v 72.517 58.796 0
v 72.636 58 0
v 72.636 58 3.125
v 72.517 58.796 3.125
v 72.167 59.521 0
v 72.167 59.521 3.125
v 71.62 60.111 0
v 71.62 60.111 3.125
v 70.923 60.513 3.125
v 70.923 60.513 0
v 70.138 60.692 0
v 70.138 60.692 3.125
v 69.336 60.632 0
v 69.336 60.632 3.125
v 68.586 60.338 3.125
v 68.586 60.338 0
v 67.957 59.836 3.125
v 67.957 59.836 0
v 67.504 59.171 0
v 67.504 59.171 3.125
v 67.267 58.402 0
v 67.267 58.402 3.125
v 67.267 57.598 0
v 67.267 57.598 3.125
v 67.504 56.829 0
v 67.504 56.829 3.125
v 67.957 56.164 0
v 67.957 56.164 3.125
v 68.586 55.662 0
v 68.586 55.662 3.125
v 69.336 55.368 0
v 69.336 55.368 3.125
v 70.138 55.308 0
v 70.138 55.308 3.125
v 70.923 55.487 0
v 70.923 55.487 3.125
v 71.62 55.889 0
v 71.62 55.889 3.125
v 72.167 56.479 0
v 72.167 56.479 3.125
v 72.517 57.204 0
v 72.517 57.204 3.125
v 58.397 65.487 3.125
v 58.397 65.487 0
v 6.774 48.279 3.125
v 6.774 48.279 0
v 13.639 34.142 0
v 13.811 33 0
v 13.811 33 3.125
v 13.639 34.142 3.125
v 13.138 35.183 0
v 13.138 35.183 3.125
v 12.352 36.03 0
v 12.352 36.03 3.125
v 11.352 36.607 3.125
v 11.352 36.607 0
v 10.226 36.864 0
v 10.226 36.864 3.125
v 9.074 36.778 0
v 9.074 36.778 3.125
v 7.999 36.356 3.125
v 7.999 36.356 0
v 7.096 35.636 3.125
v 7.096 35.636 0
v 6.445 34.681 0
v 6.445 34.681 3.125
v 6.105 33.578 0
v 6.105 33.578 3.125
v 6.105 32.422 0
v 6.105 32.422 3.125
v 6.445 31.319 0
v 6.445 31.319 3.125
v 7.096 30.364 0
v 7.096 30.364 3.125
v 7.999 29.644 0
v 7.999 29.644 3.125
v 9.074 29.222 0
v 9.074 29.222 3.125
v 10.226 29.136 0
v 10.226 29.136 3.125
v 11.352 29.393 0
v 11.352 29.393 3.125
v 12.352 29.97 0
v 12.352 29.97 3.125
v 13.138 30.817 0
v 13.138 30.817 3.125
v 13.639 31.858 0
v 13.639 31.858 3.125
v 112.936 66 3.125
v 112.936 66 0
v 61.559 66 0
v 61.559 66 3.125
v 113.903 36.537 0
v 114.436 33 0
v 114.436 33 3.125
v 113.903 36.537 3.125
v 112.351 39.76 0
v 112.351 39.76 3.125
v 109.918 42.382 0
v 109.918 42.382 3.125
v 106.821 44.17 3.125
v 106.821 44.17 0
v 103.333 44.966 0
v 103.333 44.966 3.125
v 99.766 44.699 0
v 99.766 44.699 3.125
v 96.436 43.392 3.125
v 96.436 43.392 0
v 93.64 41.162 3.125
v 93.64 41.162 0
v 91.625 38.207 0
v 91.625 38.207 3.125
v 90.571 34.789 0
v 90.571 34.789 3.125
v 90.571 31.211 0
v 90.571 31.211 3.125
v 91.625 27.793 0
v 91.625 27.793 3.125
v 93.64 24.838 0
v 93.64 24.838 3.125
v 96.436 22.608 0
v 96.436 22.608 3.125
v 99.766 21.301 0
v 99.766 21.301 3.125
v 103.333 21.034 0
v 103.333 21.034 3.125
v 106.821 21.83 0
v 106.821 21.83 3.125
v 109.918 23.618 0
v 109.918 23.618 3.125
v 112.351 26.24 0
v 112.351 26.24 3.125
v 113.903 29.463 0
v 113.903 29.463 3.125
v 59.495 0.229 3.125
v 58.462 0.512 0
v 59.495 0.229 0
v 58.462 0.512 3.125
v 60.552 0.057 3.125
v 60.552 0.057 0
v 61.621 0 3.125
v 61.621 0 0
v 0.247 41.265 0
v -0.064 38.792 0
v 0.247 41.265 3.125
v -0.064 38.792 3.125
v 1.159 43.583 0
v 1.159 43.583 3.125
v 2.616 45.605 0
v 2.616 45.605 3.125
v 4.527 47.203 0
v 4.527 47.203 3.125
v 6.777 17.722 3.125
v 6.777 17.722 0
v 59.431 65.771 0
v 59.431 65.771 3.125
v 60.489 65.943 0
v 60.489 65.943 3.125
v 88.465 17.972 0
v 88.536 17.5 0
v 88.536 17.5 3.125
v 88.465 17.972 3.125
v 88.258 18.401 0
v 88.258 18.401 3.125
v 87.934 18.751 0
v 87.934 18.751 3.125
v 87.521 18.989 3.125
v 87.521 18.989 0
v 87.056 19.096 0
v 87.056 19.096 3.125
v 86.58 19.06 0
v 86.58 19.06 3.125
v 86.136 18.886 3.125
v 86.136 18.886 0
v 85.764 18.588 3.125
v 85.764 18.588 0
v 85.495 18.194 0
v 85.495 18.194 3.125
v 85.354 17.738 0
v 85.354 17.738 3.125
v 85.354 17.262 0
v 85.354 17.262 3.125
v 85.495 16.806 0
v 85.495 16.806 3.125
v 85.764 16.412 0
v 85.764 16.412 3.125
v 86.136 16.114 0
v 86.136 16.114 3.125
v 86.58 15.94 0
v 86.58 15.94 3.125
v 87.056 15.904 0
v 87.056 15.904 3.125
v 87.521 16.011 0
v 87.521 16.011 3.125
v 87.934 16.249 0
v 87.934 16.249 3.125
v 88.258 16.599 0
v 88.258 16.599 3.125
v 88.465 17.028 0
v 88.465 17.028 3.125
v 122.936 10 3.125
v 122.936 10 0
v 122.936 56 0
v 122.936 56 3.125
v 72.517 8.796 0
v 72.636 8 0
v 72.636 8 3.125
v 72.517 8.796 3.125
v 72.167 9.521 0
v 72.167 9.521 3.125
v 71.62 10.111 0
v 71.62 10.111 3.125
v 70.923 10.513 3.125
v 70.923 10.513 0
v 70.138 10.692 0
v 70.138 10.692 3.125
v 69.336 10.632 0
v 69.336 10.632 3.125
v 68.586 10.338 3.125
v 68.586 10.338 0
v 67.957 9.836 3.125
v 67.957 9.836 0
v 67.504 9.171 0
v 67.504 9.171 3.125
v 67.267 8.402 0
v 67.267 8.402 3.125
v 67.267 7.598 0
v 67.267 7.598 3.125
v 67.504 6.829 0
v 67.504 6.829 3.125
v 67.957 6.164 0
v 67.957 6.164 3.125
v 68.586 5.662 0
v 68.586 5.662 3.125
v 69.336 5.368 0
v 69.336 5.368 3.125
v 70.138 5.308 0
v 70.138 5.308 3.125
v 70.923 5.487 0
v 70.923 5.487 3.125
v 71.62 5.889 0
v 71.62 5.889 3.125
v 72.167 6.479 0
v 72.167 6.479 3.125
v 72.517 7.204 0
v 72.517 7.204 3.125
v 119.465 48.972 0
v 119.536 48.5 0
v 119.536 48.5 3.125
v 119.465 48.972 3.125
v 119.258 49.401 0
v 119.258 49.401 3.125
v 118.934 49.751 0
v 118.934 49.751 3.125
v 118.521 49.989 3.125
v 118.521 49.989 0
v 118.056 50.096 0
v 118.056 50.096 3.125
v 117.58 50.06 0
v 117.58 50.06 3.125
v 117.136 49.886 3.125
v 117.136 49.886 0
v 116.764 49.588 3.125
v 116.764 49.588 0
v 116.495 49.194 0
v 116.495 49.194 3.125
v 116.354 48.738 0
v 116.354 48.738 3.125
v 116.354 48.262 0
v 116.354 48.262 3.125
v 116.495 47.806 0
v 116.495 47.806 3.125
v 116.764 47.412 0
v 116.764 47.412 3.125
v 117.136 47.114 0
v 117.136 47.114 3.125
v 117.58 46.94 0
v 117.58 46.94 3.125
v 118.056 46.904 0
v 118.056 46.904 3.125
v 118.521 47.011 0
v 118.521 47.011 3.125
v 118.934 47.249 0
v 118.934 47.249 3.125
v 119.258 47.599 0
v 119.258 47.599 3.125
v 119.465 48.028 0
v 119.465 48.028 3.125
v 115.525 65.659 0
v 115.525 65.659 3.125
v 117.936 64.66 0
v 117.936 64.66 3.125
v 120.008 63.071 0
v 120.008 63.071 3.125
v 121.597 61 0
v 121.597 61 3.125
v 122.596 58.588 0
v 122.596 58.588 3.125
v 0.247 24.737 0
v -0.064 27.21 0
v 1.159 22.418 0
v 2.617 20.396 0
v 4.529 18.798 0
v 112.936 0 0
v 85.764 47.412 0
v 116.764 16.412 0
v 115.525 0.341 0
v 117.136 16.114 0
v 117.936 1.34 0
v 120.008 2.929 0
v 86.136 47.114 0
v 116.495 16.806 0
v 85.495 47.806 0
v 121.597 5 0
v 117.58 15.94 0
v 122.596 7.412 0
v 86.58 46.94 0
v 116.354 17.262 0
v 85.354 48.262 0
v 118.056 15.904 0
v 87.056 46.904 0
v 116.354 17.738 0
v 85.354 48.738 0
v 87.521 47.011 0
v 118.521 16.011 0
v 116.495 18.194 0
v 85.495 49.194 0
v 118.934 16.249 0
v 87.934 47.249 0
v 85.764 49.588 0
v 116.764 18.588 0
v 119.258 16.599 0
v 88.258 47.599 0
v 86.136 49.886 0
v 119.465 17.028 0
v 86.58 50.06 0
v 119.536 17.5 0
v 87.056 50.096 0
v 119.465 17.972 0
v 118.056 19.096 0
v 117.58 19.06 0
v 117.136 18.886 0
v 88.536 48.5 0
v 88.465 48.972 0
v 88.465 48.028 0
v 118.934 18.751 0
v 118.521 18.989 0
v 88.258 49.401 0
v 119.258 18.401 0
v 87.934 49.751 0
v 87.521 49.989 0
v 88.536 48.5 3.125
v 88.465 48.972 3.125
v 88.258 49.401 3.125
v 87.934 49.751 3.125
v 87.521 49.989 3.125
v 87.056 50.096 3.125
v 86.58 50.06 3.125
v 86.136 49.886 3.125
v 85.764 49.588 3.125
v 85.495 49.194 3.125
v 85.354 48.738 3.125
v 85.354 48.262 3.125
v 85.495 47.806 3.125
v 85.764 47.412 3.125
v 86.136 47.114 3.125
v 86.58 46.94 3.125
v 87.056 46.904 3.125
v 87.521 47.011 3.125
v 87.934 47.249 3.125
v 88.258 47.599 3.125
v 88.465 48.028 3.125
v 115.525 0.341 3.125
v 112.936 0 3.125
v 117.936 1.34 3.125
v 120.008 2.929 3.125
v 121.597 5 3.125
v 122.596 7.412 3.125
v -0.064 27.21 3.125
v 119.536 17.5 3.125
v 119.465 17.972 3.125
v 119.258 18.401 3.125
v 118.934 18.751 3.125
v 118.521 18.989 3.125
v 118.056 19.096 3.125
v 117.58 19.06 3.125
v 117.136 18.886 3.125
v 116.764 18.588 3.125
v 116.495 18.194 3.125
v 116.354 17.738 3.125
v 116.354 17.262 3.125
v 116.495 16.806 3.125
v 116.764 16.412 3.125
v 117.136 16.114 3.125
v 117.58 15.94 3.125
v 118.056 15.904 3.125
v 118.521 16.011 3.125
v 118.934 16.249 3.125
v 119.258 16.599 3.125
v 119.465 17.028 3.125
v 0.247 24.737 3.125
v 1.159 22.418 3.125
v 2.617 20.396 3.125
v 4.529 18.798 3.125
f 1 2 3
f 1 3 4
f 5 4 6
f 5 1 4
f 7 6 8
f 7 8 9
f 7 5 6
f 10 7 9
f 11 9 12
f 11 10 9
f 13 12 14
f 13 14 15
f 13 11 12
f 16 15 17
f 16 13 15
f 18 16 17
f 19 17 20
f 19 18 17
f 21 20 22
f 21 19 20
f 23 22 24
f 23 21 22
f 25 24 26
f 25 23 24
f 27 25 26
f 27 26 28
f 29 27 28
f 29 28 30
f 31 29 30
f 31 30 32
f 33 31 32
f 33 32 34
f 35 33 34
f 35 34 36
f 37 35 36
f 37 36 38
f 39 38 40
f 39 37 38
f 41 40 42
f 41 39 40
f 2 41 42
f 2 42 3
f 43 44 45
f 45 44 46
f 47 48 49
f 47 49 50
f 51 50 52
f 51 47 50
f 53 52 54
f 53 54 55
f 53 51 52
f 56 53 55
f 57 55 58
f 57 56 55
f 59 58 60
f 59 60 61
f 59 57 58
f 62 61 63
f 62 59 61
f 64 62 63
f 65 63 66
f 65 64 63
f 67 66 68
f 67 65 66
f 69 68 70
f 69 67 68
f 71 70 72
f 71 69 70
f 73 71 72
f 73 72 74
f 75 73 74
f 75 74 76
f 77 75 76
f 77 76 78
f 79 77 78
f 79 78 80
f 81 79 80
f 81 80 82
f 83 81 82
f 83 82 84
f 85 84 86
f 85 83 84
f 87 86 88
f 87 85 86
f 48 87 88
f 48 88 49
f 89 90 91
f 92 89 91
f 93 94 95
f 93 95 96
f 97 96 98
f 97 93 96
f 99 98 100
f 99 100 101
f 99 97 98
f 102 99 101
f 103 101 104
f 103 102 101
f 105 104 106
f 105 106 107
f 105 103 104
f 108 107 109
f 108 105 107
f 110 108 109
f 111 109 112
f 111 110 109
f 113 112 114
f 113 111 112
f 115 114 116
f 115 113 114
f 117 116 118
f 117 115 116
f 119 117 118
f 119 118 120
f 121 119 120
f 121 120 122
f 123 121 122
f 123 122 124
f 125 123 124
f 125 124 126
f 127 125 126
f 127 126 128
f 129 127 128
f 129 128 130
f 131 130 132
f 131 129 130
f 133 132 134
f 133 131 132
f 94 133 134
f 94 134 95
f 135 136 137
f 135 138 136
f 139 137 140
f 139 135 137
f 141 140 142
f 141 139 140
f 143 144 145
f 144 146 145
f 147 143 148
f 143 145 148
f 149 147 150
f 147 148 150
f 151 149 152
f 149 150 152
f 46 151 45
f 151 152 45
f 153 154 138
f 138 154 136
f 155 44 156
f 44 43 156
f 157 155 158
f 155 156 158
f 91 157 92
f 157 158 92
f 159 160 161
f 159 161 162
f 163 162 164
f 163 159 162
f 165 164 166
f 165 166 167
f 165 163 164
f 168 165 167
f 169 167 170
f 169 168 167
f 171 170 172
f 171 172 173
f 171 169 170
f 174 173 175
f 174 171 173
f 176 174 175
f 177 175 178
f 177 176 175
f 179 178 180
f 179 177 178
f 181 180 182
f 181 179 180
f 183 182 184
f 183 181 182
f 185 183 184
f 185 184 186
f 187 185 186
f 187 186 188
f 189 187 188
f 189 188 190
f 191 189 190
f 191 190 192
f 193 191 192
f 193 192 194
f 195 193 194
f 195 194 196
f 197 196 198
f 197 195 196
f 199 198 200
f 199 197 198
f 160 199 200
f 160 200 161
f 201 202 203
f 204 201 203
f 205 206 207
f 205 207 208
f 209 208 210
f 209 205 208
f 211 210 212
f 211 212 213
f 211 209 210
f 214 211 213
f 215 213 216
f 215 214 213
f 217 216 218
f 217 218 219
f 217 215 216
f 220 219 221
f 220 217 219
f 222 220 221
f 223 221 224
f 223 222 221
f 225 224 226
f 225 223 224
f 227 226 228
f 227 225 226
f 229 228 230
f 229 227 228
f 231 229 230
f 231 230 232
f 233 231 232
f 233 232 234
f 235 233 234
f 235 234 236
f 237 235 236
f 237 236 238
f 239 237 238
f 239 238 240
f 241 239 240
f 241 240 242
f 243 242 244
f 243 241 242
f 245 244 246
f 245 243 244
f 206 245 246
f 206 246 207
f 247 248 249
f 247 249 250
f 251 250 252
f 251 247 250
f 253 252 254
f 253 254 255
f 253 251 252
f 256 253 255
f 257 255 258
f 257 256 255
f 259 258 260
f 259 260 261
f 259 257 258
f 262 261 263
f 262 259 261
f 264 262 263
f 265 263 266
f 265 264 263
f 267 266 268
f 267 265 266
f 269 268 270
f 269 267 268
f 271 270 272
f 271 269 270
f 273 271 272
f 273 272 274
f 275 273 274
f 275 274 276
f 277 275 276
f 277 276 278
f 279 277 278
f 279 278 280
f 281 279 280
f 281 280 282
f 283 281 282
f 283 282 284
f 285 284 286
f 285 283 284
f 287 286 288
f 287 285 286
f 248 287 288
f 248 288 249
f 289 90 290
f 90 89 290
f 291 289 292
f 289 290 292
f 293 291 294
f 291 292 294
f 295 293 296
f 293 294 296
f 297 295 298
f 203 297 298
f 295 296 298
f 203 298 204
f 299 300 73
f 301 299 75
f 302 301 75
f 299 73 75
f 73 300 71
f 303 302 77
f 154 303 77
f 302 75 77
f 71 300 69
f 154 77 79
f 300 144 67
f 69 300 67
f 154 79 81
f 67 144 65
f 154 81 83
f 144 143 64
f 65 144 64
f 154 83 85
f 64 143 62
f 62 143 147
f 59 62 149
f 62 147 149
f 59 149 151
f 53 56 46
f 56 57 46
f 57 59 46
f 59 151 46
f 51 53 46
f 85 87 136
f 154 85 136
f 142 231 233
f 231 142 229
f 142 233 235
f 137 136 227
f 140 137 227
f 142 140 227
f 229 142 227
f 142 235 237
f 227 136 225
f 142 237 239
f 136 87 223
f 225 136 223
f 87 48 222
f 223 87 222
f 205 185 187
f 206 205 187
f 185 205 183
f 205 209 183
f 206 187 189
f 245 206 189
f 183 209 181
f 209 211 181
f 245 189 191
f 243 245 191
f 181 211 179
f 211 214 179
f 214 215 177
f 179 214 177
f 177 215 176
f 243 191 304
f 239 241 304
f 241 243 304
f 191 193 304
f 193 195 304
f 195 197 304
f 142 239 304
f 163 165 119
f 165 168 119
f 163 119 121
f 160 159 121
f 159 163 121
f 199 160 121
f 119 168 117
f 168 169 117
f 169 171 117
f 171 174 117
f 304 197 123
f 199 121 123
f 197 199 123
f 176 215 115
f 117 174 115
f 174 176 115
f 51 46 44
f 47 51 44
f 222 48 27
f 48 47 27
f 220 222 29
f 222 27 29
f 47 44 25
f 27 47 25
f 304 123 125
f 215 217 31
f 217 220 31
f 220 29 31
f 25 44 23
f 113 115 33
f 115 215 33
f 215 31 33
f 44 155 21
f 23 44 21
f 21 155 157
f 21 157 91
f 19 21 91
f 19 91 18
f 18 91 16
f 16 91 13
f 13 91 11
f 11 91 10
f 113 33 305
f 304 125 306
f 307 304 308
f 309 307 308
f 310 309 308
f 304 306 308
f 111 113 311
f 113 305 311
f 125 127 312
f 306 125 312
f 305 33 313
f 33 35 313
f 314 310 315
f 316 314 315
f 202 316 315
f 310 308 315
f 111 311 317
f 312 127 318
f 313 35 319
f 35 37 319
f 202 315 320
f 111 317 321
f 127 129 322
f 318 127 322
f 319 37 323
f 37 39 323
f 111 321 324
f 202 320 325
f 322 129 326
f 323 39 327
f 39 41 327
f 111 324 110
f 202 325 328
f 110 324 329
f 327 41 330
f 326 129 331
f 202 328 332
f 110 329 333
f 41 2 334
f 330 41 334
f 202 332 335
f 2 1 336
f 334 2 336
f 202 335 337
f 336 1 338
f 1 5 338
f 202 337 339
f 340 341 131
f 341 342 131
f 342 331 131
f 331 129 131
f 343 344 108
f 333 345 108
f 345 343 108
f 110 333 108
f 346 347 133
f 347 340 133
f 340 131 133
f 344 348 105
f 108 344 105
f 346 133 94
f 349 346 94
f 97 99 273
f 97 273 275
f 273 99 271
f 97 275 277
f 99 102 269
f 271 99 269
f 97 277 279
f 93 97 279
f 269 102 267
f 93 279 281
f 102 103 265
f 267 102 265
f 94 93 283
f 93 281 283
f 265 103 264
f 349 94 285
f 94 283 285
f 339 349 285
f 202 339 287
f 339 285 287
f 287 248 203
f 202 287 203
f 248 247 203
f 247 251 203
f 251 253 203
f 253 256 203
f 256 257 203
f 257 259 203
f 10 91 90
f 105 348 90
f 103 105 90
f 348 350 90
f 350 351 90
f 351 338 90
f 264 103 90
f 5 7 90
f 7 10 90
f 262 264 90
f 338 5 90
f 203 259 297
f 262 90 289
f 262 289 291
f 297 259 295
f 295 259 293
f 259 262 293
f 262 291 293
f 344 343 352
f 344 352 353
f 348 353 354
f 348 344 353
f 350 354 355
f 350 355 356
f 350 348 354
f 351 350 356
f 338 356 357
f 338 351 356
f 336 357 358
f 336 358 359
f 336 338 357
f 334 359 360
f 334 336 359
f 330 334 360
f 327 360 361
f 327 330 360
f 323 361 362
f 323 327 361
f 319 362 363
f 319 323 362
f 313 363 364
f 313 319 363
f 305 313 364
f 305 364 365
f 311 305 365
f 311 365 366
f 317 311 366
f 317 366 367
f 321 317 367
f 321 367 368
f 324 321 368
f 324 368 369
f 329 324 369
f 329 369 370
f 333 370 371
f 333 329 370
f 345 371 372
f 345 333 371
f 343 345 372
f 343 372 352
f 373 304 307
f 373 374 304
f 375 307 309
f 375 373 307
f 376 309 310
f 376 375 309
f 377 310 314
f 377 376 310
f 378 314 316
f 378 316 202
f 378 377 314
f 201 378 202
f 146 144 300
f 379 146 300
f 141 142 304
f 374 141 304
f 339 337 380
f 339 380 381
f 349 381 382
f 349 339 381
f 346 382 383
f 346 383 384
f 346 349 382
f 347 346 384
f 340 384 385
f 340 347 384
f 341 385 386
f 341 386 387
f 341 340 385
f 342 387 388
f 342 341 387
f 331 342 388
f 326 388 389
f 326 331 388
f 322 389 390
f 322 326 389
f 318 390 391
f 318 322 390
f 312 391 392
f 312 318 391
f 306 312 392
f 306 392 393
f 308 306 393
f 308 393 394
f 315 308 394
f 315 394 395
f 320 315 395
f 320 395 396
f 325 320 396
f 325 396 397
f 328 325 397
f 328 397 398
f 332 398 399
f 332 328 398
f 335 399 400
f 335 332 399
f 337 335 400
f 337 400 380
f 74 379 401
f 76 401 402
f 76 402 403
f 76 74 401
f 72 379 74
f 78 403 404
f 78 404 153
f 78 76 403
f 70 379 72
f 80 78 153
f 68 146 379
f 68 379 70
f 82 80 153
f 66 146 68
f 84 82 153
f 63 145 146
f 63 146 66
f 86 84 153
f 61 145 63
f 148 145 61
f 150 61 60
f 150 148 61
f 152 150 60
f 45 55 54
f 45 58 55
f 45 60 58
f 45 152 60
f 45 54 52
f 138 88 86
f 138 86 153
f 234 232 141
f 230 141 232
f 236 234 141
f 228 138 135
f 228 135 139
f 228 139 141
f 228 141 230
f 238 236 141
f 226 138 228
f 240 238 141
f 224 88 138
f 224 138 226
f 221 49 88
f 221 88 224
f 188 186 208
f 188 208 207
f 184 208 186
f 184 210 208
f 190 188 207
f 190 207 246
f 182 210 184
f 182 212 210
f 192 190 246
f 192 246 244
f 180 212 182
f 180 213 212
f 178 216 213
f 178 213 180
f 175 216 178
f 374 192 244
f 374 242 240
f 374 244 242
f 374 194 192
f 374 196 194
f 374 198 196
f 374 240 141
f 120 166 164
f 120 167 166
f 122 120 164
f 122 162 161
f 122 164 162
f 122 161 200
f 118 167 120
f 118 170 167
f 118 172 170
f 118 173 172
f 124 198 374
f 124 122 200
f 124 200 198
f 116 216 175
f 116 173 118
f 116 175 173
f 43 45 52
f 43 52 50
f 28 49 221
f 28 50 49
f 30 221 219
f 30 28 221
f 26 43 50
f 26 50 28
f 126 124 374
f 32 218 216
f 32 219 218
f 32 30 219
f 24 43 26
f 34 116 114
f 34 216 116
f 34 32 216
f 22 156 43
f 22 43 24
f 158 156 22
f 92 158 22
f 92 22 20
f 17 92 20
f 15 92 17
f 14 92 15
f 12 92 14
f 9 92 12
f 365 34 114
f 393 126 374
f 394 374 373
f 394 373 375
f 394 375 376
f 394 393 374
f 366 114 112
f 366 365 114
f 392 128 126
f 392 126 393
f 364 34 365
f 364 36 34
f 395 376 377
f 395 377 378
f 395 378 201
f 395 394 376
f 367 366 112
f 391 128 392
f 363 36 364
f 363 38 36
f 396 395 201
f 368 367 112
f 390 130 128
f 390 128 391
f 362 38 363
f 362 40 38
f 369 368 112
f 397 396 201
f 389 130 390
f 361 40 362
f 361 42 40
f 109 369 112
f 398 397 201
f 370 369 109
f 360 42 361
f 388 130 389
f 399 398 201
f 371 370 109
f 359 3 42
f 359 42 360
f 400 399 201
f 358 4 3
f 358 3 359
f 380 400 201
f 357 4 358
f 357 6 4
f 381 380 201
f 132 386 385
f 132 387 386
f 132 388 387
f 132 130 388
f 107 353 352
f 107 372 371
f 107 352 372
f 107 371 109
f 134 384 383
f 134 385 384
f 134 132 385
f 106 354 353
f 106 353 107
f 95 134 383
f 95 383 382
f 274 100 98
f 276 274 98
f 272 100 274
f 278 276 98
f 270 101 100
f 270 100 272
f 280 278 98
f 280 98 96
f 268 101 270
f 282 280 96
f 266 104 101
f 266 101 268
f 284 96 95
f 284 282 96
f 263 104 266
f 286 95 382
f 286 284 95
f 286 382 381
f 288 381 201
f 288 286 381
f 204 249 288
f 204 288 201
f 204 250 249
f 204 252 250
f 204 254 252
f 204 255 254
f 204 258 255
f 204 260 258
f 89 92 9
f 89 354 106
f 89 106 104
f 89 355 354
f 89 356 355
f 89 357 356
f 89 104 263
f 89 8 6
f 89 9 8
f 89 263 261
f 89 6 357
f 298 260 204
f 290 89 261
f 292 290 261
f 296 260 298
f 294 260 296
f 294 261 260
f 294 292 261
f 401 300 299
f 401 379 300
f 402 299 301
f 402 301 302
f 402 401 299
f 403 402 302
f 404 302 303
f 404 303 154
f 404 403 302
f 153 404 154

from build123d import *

# Parameters (mm, degrees)
MODEL_R             = 2.7
MODEL_R_2           = 3.875
MODEL_R_3           = 12
MODEL_R_4           = 1.6
BOSS_EXTRUDE1_DEPTH = 3.125
FILLET1_R           = 10


with BuildPart() as part:
    # Model → Boss-Extrude1 (new body)
    with BuildSketch(Plane.XY):
        Polygon((-0.063524835, 46), (-0.063524835, 20), (60, 0), (122.936475165, 0), (122.936475165, 66), (59.936475165, 66), align=None)
        with Locations((69.936475165, 8)):
            Circle(MODEL_R, mode=Mode.SUBTRACT)
        with Locations((9.936475165, 33)):
            Circle(MODEL_R_2, mode=Mode.SUBTRACT)
        with Locations((69.936475165, 58)):
            Circle(MODEL_R, mode=Mode.SUBTRACT)
        with Locations((102.436475165, 33)):
            Circle(MODEL_R_3, mode=Mode.SUBTRACT)
        with Locations((86.936475165, 48.5)):
            Circle(MODEL_R_4, mode=Mode.SUBTRACT)
        with Locations((117.936475165, 48.5)):
            Circle(MODEL_R_4, mode=Mode.SUBTRACT)
        with Locations((86.936475165, 17.5)):
            Circle(MODEL_R_4, mode=Mode.SUBTRACT)
        with Locations((117.936475165, 17.5)):
            Circle(MODEL_R_4, mode=Mode.SUBTRACT)
    extrude(amount=BOSS_EXTRUDE1_DEPTH)

    # Fillet1
    fillet1_edges = [part.edges().sort_by_distance(p)[0] for p in [
        (59.936475165, 66, 1.5625),
        (122.936475165, 66, 1.5625),
        (122.936475165, 0, 1.5625),
        (60, 0, 1.5625),
        (-0.063524835, 20, 1.5625),
        (-0.063524835, 46, 1.5625),
    ]]
    fillet(fillet1_edges, radius=FILLET1_R)


solid = part.part
